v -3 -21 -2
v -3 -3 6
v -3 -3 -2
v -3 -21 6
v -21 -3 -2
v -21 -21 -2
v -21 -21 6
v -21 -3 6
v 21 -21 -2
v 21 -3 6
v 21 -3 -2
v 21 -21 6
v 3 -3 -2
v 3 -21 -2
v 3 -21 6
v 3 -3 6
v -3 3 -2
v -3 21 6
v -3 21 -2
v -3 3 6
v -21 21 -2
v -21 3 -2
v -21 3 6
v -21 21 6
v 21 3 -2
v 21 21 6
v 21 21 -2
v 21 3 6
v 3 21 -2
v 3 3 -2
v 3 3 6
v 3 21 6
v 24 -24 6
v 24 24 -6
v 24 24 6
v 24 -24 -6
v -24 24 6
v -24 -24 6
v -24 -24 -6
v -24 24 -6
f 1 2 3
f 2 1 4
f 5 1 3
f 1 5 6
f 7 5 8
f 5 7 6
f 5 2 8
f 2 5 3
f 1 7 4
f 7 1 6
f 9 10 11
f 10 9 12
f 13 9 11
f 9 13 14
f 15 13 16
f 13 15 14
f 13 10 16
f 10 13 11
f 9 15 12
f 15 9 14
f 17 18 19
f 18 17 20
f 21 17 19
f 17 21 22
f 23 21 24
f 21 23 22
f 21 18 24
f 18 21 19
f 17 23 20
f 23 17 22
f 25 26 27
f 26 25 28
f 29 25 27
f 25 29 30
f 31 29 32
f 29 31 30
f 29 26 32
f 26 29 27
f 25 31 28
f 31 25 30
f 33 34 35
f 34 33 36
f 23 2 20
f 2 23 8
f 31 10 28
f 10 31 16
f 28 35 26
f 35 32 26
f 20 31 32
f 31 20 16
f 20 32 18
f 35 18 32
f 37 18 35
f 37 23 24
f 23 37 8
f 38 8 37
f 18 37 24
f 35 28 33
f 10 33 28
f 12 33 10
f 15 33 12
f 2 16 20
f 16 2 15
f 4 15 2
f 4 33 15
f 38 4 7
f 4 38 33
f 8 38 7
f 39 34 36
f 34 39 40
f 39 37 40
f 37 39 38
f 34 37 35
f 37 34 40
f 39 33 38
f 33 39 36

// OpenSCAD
$fn = 32;

// ----------------------------------------------------------------------
// Pocket plate 48 x 48 x 12
// 2 x 2 pockets 18 mm square, 8 mm deep
// ----------------------------------------------------------------------

// --- parameters (mm) ---
thickness = 12;  // plate thickness
floor_t = 4;     // material left under each pocket
pocket = 18;     // pocket side length
pitch_x = 24;    // pocket pitch along X
pitch_y = 24;    // pocket pitch along Y
cols = 2;        // pockets per row
rows = 2;        // rows of pockets

// --- derived feature positions (mm) ---
depth = thickness - floor_t;        // = 8   pocket depth, down to the floor
span_x = (cols - 1) * pitch_x;      // = 24   distance between outer pockets
span_y = (rows - 1) * pitch_y;      // = 24   distance between outer pocket rows
origin_x = -span_x / 2;             // = -12   X of the first pocket
origin_y = -span_y / 2;             // = -12   Y of the first pocket
plate = [span_x + pocket + 6, span_y + pocket + 6, thickness];  // = [48, 48, 12]   overall size: pockets plus 3 mm of wall on each side
feature_centers = [
  [origin_x + 0 * pitch_x, origin_y + 0 * pitch_y],
  [origin_x + 1 * pitch_x, origin_y + 0 * pitch_y],
  [origin_x + 0 * pitch_x, origin_y + 1 * pitch_y],
  [origin_x + 1 * pitch_x, origin_y + 1 * pitch_y]
];   // pocket centres, used verbatim by the cutter loop

// plate outline, then one pocket per centre in feature_centers
difference() {
  cube(plate, center = true);
  for (centre = feature_centers)
    translate([centre[0] - pocket / 2, centre[1] - pocket / 2, plate[2] / 2 - depth])
      cube([pocket, pocket, depth + 1]);  // centred on the declared pocket centre
}
